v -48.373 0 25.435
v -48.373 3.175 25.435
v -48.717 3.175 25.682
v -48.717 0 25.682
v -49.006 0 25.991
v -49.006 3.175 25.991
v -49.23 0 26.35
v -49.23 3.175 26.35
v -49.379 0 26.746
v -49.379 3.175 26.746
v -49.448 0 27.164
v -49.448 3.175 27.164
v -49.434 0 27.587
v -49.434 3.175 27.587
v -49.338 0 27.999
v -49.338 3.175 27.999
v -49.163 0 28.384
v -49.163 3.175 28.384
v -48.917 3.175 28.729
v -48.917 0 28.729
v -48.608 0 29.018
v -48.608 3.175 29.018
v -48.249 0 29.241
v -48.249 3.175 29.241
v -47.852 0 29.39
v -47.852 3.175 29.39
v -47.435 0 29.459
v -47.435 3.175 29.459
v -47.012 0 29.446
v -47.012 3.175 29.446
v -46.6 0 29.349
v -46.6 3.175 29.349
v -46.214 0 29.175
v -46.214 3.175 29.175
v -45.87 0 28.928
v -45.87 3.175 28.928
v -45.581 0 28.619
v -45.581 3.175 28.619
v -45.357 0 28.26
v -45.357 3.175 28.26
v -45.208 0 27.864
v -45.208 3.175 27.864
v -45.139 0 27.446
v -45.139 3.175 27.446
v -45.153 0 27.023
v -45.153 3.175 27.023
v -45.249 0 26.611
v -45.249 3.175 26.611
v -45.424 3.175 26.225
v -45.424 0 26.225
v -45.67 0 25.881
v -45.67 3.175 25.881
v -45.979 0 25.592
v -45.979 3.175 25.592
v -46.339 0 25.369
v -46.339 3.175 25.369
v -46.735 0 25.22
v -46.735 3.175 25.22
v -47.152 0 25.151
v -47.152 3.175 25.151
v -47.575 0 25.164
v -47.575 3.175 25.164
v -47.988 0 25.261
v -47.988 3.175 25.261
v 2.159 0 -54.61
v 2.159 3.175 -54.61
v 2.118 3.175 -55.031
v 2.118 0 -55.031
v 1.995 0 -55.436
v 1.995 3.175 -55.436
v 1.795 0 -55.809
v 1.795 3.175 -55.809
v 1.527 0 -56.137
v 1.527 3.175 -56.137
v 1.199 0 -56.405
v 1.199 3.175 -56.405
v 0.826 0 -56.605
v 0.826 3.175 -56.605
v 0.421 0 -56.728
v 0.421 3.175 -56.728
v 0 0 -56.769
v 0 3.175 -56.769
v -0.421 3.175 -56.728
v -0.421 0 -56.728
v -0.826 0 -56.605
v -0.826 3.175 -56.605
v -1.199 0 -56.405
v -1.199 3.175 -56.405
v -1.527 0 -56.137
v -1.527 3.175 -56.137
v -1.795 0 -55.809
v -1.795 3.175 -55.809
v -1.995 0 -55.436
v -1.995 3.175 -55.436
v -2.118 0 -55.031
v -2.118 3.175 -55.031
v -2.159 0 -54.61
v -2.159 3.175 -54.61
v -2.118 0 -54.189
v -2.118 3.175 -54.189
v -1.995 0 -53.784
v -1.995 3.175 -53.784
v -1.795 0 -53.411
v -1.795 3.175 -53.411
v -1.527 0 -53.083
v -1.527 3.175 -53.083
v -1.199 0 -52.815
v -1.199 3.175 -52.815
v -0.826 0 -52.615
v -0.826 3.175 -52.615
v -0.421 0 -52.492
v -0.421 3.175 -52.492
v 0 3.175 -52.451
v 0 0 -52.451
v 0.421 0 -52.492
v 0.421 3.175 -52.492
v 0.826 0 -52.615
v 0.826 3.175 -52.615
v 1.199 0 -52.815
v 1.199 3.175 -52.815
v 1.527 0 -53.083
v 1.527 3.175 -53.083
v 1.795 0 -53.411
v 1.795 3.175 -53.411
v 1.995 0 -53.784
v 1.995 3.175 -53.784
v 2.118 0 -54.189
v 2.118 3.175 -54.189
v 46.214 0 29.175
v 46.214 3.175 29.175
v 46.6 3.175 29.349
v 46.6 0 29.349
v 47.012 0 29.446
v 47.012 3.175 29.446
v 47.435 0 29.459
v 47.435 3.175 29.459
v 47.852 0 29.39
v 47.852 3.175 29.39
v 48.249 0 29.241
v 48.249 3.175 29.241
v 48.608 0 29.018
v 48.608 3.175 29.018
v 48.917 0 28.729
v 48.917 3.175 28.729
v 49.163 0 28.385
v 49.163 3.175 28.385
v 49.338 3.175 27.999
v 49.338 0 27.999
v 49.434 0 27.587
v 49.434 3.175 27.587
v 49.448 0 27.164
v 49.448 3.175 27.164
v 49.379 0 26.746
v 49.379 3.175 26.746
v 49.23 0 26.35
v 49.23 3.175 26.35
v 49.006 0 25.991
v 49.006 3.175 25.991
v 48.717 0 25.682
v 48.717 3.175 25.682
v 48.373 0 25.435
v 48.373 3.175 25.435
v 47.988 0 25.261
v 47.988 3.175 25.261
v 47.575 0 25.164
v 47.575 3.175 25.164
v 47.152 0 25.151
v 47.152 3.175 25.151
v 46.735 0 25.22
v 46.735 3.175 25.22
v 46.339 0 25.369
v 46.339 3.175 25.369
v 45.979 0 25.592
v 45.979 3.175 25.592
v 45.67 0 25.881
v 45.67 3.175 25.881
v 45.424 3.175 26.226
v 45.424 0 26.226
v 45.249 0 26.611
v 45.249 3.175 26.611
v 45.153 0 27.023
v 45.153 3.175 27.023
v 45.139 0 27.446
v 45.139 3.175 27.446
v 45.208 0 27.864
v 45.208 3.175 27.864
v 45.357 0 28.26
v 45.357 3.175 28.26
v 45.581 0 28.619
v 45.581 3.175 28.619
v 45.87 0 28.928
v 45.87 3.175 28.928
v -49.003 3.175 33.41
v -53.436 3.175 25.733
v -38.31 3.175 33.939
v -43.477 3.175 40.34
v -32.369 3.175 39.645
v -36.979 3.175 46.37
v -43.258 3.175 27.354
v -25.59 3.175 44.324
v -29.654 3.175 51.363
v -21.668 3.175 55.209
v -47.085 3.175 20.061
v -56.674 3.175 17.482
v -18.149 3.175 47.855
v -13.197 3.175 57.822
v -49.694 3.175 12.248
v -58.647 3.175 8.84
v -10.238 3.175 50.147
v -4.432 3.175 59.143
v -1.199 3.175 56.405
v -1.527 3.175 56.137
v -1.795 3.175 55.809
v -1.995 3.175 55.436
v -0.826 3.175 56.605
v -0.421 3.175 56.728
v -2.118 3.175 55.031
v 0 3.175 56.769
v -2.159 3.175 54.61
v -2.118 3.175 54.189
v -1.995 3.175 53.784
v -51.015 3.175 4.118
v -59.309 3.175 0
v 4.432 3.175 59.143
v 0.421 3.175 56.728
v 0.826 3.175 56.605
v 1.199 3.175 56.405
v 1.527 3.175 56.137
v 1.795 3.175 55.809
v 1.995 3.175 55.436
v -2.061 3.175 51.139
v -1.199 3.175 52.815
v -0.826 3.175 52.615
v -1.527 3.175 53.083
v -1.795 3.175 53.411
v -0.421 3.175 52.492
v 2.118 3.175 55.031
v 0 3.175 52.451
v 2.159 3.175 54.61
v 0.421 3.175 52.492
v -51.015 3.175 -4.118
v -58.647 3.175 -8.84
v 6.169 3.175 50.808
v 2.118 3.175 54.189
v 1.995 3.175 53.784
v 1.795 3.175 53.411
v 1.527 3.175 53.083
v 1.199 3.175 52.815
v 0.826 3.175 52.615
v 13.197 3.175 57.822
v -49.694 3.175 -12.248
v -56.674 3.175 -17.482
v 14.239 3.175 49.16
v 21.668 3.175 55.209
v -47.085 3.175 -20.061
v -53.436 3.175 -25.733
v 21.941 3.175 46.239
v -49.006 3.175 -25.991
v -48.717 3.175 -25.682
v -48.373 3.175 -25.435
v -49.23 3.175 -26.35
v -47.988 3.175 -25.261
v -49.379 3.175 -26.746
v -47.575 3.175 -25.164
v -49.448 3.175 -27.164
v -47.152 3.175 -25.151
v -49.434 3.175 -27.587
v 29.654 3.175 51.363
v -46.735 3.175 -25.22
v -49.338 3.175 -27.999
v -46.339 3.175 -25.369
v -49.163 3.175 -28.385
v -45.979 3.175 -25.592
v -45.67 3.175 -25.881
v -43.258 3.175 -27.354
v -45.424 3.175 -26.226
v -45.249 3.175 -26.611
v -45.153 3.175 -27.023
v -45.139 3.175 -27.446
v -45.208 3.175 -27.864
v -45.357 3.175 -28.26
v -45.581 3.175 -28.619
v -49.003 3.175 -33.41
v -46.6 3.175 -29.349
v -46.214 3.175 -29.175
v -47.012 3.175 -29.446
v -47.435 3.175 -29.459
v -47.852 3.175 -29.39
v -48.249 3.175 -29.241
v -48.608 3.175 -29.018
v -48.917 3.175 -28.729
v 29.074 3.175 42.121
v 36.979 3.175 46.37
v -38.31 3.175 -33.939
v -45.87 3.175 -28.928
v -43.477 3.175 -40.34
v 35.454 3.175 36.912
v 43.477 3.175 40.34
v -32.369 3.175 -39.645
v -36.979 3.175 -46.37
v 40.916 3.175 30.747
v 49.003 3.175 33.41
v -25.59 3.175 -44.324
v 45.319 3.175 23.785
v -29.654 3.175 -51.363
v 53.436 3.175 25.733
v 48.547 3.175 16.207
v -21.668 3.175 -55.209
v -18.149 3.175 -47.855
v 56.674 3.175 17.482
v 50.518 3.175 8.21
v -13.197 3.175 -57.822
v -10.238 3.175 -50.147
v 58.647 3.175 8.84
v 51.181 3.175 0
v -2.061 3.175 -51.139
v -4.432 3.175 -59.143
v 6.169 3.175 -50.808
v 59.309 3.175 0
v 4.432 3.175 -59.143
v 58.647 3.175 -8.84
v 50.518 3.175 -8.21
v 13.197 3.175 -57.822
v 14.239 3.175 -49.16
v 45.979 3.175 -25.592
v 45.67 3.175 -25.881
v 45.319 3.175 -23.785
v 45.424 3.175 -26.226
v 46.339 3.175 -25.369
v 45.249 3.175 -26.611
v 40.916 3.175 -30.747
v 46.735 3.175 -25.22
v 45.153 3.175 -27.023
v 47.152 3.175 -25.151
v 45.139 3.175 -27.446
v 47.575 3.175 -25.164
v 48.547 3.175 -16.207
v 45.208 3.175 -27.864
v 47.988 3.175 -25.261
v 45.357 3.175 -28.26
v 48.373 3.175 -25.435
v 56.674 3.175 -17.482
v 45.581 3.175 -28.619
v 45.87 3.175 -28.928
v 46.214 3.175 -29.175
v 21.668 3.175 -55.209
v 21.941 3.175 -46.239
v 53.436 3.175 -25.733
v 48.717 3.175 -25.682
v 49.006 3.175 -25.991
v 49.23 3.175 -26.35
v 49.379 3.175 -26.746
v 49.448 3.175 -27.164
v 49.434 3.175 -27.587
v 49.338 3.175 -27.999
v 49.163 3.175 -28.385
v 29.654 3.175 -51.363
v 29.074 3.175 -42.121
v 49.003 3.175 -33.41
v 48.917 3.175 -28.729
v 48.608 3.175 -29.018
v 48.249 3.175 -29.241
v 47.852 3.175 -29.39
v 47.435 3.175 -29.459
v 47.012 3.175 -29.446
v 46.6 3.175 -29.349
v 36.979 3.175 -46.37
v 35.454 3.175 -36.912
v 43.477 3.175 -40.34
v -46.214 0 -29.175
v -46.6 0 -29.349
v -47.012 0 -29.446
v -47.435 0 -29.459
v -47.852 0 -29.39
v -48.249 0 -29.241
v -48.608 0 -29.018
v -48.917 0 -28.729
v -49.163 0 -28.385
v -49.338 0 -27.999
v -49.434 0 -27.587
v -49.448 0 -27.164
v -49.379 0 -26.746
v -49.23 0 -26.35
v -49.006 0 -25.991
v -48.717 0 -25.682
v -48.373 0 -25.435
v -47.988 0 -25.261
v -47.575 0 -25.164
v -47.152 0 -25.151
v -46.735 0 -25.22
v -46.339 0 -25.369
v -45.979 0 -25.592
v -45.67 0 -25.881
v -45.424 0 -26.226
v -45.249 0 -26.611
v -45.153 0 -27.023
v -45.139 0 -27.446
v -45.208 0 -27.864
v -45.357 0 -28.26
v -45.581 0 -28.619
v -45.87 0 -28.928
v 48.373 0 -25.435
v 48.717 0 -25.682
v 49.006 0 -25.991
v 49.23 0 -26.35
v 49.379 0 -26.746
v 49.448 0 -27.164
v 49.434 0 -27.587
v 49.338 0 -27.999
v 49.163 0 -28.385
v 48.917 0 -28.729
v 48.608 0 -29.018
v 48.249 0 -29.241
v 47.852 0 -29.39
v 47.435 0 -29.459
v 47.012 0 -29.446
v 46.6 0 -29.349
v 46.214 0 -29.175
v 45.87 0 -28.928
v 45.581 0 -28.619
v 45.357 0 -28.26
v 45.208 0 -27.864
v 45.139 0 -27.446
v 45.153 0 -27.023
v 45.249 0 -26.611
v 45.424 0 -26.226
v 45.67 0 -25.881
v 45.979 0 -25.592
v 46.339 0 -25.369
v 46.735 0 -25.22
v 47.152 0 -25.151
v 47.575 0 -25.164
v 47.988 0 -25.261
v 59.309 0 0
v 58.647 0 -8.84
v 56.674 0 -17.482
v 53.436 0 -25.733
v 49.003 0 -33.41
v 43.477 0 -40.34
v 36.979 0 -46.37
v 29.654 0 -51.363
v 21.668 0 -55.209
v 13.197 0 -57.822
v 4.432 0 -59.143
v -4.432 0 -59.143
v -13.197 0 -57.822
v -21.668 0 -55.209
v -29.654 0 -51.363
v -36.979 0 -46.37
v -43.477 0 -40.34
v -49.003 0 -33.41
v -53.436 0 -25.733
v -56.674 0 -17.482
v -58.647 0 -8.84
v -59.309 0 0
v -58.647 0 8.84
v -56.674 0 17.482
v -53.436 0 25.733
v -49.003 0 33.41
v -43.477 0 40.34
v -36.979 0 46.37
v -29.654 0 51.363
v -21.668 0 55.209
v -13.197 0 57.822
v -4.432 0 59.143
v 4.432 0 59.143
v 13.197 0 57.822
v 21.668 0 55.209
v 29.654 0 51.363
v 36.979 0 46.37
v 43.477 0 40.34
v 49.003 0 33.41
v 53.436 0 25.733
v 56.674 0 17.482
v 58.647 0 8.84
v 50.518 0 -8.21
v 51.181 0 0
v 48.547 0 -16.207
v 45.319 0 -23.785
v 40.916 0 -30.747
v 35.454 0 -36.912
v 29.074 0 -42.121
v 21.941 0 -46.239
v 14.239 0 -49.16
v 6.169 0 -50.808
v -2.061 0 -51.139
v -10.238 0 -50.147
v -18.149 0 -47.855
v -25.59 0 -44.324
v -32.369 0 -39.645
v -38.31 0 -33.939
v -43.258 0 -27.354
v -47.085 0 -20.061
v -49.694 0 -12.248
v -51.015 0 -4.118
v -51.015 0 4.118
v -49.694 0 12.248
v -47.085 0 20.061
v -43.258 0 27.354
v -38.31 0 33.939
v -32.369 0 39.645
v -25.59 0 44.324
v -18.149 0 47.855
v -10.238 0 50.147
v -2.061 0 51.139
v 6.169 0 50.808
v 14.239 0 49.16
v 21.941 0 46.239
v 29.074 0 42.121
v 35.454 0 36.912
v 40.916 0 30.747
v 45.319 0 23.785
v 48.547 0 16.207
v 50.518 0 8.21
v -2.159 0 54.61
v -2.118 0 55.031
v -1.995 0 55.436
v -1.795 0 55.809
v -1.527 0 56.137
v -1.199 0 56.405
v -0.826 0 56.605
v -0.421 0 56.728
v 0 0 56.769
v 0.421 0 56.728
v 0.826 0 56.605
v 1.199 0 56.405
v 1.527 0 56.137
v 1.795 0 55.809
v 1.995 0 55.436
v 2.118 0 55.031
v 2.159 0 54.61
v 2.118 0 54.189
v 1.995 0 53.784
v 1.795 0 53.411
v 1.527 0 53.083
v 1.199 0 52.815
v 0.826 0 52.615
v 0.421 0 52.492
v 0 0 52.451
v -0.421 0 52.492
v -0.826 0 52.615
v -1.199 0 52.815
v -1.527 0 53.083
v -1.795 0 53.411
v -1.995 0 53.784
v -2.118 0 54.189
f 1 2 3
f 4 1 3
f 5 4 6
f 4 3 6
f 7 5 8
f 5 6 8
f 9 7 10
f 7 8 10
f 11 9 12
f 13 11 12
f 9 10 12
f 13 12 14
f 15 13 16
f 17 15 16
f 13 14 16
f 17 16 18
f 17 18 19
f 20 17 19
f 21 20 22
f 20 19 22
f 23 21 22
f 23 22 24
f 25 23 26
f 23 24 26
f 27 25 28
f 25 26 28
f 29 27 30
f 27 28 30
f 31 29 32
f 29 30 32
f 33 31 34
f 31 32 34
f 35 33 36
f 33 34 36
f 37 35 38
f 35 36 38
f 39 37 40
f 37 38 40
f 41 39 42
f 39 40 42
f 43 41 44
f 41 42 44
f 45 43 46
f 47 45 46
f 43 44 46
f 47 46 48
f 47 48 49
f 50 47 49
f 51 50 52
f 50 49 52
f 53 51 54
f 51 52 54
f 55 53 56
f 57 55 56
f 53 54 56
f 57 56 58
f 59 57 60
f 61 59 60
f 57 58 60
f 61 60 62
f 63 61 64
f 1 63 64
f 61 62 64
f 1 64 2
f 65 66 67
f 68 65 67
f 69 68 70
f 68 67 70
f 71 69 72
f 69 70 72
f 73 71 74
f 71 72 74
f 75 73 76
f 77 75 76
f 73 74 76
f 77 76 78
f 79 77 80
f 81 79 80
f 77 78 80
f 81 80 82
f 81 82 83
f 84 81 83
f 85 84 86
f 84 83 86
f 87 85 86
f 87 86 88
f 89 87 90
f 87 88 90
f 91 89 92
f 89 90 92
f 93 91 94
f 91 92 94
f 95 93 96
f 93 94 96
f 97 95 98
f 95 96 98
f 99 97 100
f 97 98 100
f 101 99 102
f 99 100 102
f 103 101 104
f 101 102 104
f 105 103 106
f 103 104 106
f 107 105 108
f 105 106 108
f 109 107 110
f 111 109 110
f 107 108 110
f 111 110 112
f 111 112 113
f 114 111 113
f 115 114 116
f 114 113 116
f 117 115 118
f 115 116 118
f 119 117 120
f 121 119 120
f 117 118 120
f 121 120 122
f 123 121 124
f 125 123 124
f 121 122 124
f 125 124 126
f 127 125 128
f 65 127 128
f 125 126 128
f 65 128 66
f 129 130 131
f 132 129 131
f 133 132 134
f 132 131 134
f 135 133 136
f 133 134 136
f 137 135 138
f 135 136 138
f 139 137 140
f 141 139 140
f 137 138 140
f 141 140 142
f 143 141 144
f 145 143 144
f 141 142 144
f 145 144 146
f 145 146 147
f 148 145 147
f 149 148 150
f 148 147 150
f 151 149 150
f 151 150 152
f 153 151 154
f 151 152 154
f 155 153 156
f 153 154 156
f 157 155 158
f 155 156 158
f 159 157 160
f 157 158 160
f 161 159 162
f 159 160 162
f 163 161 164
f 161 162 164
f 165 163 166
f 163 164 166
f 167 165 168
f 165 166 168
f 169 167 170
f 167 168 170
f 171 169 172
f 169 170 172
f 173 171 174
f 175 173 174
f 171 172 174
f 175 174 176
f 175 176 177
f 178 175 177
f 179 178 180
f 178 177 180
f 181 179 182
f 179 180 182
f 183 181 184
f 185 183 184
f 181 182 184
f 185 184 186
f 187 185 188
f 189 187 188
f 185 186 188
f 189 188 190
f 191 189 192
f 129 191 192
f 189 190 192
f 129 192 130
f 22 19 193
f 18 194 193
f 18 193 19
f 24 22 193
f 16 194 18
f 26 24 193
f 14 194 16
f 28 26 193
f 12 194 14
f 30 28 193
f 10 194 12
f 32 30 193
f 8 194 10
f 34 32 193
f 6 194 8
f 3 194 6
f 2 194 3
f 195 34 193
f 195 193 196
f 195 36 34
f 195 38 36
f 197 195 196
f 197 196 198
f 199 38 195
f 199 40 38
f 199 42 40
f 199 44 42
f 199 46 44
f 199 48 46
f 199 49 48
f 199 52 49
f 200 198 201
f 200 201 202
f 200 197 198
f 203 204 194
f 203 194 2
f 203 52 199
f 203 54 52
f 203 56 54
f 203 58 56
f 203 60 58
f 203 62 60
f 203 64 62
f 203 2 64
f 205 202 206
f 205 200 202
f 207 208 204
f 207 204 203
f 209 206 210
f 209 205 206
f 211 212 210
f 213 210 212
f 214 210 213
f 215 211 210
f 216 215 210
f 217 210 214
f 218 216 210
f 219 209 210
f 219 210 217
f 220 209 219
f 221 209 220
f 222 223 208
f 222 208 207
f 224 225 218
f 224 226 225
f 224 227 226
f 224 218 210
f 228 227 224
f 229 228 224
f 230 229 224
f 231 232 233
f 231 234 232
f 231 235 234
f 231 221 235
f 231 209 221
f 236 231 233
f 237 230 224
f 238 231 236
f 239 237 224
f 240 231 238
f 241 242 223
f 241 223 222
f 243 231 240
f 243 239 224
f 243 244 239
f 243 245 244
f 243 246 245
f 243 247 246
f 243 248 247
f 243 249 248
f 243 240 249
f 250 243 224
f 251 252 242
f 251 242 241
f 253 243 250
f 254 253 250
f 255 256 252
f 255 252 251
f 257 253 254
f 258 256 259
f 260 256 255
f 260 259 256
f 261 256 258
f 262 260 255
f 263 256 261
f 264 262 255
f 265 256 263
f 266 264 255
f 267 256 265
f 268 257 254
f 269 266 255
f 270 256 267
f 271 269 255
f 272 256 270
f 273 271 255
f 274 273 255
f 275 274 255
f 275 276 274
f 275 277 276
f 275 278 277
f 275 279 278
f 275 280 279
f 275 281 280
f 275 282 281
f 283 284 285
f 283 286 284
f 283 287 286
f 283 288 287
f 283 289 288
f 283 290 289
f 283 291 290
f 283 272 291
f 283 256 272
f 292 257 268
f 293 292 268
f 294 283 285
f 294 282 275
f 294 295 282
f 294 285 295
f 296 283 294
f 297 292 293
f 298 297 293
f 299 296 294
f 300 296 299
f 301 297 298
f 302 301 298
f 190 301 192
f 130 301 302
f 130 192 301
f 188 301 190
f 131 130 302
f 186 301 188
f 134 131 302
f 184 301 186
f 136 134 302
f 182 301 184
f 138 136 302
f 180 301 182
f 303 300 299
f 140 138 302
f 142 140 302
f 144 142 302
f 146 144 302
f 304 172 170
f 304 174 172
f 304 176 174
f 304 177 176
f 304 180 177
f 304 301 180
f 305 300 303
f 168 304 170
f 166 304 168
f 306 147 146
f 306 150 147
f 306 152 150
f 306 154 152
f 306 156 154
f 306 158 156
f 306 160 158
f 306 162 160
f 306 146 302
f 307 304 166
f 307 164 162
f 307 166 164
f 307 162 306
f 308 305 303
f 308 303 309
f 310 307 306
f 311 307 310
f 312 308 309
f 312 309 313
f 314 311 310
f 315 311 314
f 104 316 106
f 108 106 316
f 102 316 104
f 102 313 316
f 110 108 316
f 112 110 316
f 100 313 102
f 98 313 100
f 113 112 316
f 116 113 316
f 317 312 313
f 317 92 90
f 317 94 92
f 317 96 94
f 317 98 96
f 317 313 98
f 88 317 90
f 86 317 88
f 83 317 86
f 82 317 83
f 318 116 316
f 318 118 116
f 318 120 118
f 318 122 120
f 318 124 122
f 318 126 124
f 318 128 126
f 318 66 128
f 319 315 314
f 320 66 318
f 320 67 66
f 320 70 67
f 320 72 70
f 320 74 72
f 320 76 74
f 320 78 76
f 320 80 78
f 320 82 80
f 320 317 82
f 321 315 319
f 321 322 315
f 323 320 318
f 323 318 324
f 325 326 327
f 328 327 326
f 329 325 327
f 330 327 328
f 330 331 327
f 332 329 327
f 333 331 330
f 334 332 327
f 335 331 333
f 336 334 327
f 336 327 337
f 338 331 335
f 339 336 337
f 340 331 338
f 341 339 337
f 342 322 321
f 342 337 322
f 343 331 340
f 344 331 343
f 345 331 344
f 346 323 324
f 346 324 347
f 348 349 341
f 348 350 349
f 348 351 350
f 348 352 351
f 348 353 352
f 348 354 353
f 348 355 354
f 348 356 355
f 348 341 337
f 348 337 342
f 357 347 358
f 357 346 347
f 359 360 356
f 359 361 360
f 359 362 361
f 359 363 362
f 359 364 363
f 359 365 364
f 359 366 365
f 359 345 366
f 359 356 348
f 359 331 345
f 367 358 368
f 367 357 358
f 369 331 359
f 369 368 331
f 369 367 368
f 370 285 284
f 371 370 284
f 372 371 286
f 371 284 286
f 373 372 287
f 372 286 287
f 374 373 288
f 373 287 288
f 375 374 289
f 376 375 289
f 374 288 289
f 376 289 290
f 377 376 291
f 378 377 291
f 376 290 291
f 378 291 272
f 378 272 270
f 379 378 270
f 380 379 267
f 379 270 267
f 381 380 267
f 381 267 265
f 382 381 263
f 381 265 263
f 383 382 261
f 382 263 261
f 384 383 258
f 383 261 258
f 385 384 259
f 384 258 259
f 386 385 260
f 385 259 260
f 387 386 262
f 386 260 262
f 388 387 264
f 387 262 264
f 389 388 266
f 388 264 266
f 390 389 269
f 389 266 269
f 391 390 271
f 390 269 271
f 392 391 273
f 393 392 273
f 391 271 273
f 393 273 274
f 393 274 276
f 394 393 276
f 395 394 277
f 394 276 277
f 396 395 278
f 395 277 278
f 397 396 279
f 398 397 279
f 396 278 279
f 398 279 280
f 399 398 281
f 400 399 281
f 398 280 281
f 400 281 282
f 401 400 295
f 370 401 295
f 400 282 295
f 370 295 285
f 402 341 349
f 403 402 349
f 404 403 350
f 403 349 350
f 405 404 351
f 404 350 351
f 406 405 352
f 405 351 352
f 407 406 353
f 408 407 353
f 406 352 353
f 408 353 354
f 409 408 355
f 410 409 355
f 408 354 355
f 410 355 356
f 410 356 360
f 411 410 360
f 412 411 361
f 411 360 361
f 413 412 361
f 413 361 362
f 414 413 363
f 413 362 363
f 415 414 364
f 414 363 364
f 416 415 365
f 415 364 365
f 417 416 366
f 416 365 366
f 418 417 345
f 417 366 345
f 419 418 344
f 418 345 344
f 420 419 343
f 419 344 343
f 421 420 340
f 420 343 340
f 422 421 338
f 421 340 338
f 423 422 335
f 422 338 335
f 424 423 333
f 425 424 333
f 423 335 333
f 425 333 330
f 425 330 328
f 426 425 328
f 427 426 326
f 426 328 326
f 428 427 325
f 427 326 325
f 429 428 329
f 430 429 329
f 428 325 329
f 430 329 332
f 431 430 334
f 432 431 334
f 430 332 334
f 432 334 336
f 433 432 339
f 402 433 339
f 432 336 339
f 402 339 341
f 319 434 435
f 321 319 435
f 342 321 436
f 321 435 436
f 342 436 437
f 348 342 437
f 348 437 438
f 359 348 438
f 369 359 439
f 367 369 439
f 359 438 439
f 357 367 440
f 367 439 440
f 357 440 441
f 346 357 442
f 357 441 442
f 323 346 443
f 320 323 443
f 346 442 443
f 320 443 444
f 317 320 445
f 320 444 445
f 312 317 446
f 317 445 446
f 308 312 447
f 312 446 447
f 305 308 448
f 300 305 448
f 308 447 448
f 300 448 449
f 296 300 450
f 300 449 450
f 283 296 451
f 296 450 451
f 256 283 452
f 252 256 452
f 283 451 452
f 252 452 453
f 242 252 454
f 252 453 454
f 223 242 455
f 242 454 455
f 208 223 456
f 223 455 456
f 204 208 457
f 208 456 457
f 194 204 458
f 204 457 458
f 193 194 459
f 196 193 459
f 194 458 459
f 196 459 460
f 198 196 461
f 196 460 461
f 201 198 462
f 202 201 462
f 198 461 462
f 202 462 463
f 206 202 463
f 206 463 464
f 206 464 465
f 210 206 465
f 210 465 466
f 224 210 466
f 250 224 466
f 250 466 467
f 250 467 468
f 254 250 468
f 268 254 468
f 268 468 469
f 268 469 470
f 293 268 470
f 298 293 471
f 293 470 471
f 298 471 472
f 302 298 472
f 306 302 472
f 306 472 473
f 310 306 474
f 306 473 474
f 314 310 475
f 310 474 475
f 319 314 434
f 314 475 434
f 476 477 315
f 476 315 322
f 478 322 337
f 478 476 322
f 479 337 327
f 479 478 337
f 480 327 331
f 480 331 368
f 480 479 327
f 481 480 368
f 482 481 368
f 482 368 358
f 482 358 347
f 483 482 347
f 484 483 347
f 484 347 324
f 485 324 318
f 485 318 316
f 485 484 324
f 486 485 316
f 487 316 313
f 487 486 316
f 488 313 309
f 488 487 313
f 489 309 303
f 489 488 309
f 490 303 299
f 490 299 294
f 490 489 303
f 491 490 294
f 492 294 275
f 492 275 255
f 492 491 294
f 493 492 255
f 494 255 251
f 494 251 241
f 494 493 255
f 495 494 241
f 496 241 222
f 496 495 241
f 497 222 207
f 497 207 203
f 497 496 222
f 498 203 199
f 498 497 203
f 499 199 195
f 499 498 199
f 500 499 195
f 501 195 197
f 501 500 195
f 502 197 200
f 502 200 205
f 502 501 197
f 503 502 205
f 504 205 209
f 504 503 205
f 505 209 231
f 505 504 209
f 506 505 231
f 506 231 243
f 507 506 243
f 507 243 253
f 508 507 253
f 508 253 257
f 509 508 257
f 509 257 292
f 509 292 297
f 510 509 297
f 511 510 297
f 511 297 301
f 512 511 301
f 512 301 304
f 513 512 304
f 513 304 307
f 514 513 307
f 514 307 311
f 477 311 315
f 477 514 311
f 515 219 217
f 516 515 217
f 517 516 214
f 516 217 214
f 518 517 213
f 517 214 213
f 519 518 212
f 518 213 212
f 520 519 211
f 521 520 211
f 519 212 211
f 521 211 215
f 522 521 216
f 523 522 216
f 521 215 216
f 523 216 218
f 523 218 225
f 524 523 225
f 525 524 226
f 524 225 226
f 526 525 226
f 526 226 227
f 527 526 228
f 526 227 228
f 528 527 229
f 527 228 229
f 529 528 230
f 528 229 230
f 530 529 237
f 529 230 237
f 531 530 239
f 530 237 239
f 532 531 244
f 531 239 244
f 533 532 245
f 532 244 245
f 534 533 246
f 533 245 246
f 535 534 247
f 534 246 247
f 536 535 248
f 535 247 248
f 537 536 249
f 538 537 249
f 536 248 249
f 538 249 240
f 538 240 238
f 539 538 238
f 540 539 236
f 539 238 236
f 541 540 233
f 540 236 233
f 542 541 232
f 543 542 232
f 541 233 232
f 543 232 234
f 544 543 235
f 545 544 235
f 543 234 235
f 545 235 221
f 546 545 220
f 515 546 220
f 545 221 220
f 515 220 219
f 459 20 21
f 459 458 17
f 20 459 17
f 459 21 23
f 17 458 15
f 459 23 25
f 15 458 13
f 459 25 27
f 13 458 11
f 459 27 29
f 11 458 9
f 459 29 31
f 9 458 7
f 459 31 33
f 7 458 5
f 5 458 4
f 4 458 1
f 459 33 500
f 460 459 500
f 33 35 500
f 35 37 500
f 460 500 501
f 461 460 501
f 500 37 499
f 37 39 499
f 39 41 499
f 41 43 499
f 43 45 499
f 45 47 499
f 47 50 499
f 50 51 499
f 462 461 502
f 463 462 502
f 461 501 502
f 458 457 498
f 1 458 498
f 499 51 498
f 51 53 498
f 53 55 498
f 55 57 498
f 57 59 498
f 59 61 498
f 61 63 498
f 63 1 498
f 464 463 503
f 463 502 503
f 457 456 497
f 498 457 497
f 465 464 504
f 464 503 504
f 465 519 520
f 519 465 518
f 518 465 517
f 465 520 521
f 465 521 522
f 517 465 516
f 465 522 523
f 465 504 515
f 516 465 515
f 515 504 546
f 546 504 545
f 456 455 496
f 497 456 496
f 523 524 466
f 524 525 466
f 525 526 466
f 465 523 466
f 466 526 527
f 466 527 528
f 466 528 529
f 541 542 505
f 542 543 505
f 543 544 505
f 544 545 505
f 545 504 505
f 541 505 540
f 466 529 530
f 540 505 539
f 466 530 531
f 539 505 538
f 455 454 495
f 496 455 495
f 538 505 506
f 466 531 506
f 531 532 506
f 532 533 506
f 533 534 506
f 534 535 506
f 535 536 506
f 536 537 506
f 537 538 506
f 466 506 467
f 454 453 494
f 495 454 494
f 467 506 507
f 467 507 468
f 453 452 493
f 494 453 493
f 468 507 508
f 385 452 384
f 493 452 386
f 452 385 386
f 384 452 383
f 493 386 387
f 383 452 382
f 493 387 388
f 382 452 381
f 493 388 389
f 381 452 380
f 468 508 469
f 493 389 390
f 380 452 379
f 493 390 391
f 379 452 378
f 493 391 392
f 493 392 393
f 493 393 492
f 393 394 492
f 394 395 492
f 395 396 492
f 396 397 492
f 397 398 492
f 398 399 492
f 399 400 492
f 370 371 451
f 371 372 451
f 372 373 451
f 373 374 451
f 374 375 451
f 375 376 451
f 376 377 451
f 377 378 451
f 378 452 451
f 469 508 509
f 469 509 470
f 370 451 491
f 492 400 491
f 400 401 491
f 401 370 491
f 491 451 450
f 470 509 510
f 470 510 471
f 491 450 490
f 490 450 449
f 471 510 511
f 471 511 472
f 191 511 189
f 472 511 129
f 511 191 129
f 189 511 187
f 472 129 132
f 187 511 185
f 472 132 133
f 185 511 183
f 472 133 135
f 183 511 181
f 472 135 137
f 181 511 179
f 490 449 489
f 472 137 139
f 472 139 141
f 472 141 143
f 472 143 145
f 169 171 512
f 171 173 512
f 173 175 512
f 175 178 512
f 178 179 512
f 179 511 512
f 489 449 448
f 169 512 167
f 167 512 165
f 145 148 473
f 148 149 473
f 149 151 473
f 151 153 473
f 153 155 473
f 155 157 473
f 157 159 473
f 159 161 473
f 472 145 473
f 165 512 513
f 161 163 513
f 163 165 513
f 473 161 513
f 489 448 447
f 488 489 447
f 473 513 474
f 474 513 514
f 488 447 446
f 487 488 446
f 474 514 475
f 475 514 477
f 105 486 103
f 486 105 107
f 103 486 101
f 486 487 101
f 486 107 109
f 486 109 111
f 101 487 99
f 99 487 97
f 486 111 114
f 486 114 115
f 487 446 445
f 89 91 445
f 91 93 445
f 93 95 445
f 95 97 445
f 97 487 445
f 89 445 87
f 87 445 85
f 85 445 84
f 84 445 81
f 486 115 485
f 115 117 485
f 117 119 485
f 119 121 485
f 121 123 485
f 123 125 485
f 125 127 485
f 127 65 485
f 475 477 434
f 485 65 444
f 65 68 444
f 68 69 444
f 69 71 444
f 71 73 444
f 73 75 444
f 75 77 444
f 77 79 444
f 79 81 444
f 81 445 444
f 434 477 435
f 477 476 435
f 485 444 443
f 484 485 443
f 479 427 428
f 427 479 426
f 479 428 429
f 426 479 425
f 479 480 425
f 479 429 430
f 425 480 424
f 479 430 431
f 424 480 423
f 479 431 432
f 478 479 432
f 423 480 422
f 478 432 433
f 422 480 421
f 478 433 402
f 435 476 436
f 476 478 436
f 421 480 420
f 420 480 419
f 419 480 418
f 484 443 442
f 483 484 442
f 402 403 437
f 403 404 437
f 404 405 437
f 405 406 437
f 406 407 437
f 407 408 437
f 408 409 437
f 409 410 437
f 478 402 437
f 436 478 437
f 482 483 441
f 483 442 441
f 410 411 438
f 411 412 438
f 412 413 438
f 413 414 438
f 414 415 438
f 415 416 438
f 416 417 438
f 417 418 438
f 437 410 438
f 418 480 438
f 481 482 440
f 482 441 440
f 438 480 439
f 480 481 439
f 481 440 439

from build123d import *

# Parameters (mm, degrees)
SKETCH1_R           = 59.309
SKETCH1_R_2         = 51.181
BOSS_EXTRUDE1_DEPTH = 3.175
SKETCH2_R           = 2.159
CUT_EXTRUDE1_DEPTH  = 3.175
CIRPATTERN1_COUNT   = 6


with BuildPart() as part:
    # Sketch1 → Boss-Extrude1 (new body)
    with BuildSketch(Plane(origin=(0, 0, 0), x_dir=(1, 0, 0), z_dir=(0, 1, 0))):
        Circle(SKETCH1_R)
        Circle(SKETCH1_R_2, mode=Mode.SUBTRACT)
    extrude(amount=BOSS_EXTRUDE1_DEPTH)

    # Sketch2 → Cut-Extrude1 (cut)
    with BuildSketch(Plane(origin=(0, 3.175, 0), x_dir=(1, 0, 0), z_dir=(0, 1, 0))):
        with Locations((0, 54.61)):
            Circle(SKETCH2_R)
    cut_extrude1 = extrude(amount=-CUT_EXTRUDE1_DEPTH, mode=Mode.SUBTRACT)

    # CirPattern1: Cut-Extrude1 ×6 about axis
    cirpattern1_axis = Axis((0, 0, 0), (0, 1, 0))
    for i in range(1, CIRPATTERN1_COUNT):
        add(cut_extrude1.rotate(cirpattern1_axis, i * 360 / CIRPATTERN1_COUNT), mode=Mode.SUBTRACT)


solid = part.part
